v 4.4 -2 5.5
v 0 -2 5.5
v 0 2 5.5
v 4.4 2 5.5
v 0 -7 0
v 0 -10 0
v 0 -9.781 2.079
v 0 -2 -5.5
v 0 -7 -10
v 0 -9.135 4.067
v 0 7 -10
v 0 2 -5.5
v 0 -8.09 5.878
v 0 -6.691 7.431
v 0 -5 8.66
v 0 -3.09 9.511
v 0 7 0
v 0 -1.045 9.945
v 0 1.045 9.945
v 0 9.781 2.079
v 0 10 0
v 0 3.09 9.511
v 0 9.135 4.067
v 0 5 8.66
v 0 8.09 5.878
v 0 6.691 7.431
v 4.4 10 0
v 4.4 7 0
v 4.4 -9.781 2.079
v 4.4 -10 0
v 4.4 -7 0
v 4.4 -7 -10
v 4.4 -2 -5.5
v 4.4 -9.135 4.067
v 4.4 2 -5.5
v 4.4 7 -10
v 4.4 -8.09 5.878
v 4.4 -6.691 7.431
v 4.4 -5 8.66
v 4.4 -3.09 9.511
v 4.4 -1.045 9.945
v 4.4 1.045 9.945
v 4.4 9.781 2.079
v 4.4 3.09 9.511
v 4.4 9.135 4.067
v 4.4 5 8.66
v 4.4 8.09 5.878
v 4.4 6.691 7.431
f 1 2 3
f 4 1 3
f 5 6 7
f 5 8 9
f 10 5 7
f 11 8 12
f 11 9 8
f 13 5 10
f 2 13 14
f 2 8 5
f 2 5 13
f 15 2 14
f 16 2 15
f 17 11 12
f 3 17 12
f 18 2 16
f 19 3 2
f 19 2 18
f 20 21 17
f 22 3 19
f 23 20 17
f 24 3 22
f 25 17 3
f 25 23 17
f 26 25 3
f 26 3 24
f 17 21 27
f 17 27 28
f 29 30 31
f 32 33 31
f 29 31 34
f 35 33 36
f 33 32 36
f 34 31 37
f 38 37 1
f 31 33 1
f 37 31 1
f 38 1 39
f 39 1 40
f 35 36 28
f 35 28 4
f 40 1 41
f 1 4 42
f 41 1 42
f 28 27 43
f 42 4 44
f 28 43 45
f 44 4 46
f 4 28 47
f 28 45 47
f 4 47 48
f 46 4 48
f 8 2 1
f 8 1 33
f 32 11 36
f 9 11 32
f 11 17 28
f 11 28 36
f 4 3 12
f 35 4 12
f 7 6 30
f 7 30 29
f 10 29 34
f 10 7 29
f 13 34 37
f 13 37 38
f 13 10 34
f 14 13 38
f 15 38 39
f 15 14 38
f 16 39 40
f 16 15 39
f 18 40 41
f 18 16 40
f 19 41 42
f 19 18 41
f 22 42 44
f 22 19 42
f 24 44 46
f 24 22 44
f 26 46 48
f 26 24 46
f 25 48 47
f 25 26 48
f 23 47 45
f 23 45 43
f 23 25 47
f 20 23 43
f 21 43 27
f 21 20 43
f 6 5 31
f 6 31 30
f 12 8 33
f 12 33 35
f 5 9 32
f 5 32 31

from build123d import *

# Parameters (mm, degrees)
SKETCH1_W           = 11
SKETCH1_H           = 4
BOSS_EXTRUDE1_DEPTH = 4.4


with BuildPart() as part:
    # Sketch1 → Boss-Extrude1 (new body)
    with BuildSketch(Plane(origin=(0, 0, 0), x_dir=(0, 0, -1), z_dir=(1, 0, 0))):
        with BuildLine():
            Line((0, 10), (0, 7))
            Line((0, 7), (10, 7))
            Line((10, 7), (10, -7))
            Line((10, -7), (0, -7))
            Line((0, -7), (0, -10))
            ThreePointArc((0, -10), (-10, 0), (0, 10))
        make_face()
        Rectangle(SKETCH1_W, SKETCH1_H, mode=Mode.SUBTRACT)
    extrude(amount=BOSS_EXTRUDE1_DEPTH)


solid = part.part
